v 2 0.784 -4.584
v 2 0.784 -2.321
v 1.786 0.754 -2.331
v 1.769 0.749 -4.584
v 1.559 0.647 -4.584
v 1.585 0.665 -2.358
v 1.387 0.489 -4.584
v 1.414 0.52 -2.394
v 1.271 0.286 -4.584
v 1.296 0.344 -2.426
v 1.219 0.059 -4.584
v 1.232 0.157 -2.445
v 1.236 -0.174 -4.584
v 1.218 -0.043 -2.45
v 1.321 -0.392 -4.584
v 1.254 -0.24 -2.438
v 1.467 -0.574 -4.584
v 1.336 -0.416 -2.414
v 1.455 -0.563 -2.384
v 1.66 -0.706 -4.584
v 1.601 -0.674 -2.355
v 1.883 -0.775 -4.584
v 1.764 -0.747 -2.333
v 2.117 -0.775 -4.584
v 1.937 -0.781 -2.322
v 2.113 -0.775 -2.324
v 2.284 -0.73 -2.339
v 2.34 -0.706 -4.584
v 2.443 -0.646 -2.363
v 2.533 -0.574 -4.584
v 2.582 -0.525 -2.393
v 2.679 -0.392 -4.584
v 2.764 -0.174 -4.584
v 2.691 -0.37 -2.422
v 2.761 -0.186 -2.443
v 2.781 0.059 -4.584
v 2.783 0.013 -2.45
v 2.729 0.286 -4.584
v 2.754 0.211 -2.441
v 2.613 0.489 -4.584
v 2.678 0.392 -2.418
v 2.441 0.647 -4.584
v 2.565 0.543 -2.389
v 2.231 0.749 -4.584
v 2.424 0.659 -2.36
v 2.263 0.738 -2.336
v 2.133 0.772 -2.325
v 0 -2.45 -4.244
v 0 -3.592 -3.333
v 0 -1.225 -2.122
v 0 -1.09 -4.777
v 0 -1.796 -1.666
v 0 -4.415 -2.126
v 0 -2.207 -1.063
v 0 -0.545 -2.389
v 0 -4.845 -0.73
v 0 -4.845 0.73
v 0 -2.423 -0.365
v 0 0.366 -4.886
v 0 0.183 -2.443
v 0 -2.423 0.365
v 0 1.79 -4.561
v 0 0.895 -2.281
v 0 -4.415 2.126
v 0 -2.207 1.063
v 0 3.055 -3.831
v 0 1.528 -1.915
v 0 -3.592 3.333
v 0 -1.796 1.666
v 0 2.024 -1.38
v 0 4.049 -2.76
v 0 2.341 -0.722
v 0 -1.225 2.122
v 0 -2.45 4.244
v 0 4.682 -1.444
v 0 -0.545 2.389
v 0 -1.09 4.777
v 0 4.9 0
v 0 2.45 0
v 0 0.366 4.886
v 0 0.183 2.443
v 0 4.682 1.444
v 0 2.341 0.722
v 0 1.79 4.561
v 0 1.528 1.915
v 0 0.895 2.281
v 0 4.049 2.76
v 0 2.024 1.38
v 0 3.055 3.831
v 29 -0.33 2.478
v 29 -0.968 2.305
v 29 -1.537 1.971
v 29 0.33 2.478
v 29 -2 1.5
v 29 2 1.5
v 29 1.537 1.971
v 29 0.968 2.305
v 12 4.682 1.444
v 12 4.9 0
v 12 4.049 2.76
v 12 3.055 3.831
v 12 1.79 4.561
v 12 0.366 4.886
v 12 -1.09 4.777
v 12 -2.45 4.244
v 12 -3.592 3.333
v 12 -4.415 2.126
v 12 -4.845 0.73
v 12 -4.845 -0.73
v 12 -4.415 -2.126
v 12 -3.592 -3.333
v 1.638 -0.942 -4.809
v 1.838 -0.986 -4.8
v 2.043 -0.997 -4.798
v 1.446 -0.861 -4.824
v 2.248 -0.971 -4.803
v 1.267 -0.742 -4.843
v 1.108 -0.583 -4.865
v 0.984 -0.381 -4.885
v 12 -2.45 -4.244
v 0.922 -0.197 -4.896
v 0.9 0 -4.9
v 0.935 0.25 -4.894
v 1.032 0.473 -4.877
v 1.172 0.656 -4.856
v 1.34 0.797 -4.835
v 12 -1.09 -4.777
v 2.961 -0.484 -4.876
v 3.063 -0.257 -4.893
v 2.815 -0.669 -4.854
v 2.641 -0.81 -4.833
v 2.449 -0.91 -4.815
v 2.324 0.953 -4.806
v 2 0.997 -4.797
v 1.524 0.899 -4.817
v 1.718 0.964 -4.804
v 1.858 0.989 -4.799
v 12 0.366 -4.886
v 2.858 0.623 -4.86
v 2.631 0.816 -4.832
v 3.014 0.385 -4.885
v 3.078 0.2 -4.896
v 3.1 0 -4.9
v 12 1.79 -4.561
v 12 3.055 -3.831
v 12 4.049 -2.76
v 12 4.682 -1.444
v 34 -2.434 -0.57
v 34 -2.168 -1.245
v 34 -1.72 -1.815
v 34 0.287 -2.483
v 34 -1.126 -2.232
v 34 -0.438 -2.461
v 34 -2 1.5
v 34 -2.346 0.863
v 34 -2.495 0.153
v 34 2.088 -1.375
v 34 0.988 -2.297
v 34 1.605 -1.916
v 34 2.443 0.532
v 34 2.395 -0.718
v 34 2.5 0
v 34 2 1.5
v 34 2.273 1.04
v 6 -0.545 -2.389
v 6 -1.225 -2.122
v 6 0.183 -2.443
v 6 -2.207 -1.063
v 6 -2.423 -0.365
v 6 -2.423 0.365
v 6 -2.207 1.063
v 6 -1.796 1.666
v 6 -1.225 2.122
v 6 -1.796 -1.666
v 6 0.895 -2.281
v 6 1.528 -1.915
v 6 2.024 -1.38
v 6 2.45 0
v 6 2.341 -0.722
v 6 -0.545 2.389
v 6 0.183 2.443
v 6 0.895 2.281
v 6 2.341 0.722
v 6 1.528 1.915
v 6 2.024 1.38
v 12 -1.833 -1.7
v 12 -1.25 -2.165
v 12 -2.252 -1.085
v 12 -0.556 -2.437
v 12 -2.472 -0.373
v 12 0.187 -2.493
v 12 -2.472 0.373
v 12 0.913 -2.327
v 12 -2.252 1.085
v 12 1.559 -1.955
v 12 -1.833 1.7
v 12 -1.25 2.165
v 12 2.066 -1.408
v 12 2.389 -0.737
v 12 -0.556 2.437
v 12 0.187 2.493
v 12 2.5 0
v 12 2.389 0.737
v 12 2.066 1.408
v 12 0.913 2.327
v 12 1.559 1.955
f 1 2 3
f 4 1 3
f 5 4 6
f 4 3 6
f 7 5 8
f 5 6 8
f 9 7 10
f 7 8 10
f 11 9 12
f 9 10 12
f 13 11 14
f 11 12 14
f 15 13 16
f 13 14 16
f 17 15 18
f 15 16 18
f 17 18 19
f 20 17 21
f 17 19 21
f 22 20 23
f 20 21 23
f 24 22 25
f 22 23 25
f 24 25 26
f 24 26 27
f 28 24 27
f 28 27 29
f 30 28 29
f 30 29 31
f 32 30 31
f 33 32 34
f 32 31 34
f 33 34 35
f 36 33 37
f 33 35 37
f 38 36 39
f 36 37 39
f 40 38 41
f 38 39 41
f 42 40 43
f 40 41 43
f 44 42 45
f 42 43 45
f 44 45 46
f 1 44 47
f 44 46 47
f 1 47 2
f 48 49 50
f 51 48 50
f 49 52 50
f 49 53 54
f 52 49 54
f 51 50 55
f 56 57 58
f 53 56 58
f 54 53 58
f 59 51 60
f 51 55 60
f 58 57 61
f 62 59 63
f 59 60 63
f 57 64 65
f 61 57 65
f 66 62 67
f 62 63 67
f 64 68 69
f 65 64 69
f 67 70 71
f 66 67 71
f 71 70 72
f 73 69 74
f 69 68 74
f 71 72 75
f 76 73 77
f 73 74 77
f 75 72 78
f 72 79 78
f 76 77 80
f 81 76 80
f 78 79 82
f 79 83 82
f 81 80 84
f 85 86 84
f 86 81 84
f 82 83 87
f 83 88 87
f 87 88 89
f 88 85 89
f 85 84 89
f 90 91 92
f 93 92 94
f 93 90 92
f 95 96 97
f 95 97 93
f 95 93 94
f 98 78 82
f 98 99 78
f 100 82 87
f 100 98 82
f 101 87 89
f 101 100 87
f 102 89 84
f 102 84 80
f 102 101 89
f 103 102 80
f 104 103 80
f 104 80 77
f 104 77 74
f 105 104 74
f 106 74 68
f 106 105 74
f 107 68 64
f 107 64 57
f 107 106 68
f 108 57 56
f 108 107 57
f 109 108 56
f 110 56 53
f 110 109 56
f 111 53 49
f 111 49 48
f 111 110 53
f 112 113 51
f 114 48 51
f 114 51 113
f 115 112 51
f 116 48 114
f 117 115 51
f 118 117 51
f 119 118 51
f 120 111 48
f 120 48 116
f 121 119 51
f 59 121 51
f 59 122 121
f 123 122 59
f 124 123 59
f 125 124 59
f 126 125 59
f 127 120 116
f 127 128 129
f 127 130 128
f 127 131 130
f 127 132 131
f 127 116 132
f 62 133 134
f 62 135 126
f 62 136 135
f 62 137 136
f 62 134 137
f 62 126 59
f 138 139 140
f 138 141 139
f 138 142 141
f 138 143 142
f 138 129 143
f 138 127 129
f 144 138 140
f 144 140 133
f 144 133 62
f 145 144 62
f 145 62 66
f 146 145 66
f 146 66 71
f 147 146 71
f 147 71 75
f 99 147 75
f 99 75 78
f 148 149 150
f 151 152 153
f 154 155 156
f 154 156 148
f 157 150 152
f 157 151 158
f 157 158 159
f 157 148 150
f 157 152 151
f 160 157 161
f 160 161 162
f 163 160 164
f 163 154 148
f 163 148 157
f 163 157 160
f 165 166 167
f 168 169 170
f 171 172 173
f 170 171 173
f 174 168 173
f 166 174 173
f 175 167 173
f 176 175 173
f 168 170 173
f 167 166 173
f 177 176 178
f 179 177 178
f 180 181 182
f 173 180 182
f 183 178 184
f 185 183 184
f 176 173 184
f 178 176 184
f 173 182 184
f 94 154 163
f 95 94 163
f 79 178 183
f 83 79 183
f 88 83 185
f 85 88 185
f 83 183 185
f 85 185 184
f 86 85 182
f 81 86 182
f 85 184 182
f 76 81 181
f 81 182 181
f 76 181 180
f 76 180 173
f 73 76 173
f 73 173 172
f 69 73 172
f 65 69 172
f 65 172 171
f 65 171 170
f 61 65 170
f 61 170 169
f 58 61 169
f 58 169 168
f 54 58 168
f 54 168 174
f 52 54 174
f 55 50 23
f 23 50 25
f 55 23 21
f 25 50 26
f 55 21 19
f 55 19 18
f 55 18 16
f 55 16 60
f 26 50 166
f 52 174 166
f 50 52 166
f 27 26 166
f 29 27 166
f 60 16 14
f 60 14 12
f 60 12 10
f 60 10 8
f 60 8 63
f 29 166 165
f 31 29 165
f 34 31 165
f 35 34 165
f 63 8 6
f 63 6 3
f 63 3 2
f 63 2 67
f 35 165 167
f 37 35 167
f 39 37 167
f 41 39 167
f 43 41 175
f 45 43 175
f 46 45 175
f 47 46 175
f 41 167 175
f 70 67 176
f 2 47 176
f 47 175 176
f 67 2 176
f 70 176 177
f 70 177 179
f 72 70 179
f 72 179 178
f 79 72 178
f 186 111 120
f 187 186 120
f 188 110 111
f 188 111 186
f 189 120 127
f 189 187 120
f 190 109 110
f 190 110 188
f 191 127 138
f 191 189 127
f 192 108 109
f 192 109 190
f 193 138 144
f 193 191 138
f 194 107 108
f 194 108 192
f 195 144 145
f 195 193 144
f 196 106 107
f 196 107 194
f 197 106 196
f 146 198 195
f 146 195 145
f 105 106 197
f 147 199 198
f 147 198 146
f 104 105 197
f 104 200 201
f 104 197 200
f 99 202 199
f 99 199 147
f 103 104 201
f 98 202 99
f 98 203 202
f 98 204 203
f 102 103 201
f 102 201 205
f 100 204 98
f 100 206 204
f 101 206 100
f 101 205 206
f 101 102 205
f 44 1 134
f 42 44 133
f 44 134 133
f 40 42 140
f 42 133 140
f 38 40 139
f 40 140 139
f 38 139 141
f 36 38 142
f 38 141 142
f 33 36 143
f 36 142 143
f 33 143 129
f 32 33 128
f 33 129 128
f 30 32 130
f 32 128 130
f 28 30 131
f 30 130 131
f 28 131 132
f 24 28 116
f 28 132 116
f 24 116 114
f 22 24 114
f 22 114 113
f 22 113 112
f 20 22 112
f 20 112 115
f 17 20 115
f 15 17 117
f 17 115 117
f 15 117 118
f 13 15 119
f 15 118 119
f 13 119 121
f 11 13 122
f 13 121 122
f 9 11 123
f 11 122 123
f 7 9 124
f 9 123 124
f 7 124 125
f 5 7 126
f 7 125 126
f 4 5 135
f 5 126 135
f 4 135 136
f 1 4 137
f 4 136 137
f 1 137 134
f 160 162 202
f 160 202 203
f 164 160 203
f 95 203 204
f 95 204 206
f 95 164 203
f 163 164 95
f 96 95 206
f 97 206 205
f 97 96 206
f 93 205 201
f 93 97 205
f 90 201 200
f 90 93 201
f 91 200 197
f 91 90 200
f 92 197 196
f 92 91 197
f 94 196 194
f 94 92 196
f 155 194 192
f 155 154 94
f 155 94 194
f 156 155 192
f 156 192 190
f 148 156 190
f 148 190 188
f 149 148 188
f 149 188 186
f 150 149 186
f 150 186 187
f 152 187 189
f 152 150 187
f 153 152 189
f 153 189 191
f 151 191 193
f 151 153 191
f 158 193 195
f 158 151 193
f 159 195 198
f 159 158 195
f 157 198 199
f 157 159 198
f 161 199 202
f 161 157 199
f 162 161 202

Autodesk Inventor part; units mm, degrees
ref_plane "YZ Plane" through (0, 0, 0) normal (1, 0, 0) x (0, 1, 0)
ref_plane "XZ Plane" through (0, 0, 0) normal (0, 1, 0) x (-1, 0, 0)
sketch "Sketch1" plane through (0, 0, 0) normal (0, 0, 1) x (1, 0, 0)
  line L0 (0, 0) -> (34, 0) construction
  line L1 (0, 0) -> (0, 4.9) construction
  line L2 (0, 4.9) -> (12, 4.9)
  line L3 (12, 4.9) -> (12, 2.5)
  line L4 (12, 2.5) -> (34, 2.5)
  line L5 (34, 2.5) -> (34, 0) construction
  line L6 (0, 4.9) -> (0, 2.45)
  line L7 (0, 2.45) -> (6, 2.45)
  line L8 (6, 2.45) -> (6, 0)
  line L9 (34, 2.5) -> (34, 0)
  line L10 (6, 0) -> (34, 0)
  dimension "d0" = 34
  dimension "d3" = 12
  dimension "d4" = 9.8
  dimension "d5" = 4.9
  dimension "d6" = 6
  dimension "d7" = 5
revolve "Révolution1" add sketch "Sketch1" angle 360 about axis through (6, 0, 0) along (1, 0, 0)
sketch "Esquisse2" plane through (34, 0, 0) normal (1, 0, 0) x (0, 0, -1)
  circle A0 centre (0, 0) radius 2.5 construction
  line L0 (-1.5, -2) -> (-1.5, 2)
  arc A1 (-1.5, 2) -> (-1.5, -2) centre (0, 0) ccw
  dimension "d9" = 1.5
extrude "Extrusion1" cut sketch "Esquisse2" against normal blind 5
ref_plane "Plan de construction2" through (6, 0, -4.9) normal (0, 0, -1) x (-1, 0, 0)
ref_plane "Plan de construction1" through (6, 0, 4.9) normal (0, 0, 1) x (1, 0, 0)
sketch "Esquisse4" plane through (6, 0, -4.9) normal (0, 0, -1) x (-1, 0, 0)
  line L0 (6, 4.9) -> (6, -4.9) construction
  point P0 (6, 0)
  point P1 (4, 0)
  dimension "d20" = 2
hole "Perçage2" at (2, 0, -4.9) direction (0, 0, 1) diameter 1.567 depth 5 tip angle 118 countersink diameter 2.2 countersink angle 90 thread size "M2x0.4" class "6H" standard "ISO Metric profile"
properties part number "M000" material "Acier"
